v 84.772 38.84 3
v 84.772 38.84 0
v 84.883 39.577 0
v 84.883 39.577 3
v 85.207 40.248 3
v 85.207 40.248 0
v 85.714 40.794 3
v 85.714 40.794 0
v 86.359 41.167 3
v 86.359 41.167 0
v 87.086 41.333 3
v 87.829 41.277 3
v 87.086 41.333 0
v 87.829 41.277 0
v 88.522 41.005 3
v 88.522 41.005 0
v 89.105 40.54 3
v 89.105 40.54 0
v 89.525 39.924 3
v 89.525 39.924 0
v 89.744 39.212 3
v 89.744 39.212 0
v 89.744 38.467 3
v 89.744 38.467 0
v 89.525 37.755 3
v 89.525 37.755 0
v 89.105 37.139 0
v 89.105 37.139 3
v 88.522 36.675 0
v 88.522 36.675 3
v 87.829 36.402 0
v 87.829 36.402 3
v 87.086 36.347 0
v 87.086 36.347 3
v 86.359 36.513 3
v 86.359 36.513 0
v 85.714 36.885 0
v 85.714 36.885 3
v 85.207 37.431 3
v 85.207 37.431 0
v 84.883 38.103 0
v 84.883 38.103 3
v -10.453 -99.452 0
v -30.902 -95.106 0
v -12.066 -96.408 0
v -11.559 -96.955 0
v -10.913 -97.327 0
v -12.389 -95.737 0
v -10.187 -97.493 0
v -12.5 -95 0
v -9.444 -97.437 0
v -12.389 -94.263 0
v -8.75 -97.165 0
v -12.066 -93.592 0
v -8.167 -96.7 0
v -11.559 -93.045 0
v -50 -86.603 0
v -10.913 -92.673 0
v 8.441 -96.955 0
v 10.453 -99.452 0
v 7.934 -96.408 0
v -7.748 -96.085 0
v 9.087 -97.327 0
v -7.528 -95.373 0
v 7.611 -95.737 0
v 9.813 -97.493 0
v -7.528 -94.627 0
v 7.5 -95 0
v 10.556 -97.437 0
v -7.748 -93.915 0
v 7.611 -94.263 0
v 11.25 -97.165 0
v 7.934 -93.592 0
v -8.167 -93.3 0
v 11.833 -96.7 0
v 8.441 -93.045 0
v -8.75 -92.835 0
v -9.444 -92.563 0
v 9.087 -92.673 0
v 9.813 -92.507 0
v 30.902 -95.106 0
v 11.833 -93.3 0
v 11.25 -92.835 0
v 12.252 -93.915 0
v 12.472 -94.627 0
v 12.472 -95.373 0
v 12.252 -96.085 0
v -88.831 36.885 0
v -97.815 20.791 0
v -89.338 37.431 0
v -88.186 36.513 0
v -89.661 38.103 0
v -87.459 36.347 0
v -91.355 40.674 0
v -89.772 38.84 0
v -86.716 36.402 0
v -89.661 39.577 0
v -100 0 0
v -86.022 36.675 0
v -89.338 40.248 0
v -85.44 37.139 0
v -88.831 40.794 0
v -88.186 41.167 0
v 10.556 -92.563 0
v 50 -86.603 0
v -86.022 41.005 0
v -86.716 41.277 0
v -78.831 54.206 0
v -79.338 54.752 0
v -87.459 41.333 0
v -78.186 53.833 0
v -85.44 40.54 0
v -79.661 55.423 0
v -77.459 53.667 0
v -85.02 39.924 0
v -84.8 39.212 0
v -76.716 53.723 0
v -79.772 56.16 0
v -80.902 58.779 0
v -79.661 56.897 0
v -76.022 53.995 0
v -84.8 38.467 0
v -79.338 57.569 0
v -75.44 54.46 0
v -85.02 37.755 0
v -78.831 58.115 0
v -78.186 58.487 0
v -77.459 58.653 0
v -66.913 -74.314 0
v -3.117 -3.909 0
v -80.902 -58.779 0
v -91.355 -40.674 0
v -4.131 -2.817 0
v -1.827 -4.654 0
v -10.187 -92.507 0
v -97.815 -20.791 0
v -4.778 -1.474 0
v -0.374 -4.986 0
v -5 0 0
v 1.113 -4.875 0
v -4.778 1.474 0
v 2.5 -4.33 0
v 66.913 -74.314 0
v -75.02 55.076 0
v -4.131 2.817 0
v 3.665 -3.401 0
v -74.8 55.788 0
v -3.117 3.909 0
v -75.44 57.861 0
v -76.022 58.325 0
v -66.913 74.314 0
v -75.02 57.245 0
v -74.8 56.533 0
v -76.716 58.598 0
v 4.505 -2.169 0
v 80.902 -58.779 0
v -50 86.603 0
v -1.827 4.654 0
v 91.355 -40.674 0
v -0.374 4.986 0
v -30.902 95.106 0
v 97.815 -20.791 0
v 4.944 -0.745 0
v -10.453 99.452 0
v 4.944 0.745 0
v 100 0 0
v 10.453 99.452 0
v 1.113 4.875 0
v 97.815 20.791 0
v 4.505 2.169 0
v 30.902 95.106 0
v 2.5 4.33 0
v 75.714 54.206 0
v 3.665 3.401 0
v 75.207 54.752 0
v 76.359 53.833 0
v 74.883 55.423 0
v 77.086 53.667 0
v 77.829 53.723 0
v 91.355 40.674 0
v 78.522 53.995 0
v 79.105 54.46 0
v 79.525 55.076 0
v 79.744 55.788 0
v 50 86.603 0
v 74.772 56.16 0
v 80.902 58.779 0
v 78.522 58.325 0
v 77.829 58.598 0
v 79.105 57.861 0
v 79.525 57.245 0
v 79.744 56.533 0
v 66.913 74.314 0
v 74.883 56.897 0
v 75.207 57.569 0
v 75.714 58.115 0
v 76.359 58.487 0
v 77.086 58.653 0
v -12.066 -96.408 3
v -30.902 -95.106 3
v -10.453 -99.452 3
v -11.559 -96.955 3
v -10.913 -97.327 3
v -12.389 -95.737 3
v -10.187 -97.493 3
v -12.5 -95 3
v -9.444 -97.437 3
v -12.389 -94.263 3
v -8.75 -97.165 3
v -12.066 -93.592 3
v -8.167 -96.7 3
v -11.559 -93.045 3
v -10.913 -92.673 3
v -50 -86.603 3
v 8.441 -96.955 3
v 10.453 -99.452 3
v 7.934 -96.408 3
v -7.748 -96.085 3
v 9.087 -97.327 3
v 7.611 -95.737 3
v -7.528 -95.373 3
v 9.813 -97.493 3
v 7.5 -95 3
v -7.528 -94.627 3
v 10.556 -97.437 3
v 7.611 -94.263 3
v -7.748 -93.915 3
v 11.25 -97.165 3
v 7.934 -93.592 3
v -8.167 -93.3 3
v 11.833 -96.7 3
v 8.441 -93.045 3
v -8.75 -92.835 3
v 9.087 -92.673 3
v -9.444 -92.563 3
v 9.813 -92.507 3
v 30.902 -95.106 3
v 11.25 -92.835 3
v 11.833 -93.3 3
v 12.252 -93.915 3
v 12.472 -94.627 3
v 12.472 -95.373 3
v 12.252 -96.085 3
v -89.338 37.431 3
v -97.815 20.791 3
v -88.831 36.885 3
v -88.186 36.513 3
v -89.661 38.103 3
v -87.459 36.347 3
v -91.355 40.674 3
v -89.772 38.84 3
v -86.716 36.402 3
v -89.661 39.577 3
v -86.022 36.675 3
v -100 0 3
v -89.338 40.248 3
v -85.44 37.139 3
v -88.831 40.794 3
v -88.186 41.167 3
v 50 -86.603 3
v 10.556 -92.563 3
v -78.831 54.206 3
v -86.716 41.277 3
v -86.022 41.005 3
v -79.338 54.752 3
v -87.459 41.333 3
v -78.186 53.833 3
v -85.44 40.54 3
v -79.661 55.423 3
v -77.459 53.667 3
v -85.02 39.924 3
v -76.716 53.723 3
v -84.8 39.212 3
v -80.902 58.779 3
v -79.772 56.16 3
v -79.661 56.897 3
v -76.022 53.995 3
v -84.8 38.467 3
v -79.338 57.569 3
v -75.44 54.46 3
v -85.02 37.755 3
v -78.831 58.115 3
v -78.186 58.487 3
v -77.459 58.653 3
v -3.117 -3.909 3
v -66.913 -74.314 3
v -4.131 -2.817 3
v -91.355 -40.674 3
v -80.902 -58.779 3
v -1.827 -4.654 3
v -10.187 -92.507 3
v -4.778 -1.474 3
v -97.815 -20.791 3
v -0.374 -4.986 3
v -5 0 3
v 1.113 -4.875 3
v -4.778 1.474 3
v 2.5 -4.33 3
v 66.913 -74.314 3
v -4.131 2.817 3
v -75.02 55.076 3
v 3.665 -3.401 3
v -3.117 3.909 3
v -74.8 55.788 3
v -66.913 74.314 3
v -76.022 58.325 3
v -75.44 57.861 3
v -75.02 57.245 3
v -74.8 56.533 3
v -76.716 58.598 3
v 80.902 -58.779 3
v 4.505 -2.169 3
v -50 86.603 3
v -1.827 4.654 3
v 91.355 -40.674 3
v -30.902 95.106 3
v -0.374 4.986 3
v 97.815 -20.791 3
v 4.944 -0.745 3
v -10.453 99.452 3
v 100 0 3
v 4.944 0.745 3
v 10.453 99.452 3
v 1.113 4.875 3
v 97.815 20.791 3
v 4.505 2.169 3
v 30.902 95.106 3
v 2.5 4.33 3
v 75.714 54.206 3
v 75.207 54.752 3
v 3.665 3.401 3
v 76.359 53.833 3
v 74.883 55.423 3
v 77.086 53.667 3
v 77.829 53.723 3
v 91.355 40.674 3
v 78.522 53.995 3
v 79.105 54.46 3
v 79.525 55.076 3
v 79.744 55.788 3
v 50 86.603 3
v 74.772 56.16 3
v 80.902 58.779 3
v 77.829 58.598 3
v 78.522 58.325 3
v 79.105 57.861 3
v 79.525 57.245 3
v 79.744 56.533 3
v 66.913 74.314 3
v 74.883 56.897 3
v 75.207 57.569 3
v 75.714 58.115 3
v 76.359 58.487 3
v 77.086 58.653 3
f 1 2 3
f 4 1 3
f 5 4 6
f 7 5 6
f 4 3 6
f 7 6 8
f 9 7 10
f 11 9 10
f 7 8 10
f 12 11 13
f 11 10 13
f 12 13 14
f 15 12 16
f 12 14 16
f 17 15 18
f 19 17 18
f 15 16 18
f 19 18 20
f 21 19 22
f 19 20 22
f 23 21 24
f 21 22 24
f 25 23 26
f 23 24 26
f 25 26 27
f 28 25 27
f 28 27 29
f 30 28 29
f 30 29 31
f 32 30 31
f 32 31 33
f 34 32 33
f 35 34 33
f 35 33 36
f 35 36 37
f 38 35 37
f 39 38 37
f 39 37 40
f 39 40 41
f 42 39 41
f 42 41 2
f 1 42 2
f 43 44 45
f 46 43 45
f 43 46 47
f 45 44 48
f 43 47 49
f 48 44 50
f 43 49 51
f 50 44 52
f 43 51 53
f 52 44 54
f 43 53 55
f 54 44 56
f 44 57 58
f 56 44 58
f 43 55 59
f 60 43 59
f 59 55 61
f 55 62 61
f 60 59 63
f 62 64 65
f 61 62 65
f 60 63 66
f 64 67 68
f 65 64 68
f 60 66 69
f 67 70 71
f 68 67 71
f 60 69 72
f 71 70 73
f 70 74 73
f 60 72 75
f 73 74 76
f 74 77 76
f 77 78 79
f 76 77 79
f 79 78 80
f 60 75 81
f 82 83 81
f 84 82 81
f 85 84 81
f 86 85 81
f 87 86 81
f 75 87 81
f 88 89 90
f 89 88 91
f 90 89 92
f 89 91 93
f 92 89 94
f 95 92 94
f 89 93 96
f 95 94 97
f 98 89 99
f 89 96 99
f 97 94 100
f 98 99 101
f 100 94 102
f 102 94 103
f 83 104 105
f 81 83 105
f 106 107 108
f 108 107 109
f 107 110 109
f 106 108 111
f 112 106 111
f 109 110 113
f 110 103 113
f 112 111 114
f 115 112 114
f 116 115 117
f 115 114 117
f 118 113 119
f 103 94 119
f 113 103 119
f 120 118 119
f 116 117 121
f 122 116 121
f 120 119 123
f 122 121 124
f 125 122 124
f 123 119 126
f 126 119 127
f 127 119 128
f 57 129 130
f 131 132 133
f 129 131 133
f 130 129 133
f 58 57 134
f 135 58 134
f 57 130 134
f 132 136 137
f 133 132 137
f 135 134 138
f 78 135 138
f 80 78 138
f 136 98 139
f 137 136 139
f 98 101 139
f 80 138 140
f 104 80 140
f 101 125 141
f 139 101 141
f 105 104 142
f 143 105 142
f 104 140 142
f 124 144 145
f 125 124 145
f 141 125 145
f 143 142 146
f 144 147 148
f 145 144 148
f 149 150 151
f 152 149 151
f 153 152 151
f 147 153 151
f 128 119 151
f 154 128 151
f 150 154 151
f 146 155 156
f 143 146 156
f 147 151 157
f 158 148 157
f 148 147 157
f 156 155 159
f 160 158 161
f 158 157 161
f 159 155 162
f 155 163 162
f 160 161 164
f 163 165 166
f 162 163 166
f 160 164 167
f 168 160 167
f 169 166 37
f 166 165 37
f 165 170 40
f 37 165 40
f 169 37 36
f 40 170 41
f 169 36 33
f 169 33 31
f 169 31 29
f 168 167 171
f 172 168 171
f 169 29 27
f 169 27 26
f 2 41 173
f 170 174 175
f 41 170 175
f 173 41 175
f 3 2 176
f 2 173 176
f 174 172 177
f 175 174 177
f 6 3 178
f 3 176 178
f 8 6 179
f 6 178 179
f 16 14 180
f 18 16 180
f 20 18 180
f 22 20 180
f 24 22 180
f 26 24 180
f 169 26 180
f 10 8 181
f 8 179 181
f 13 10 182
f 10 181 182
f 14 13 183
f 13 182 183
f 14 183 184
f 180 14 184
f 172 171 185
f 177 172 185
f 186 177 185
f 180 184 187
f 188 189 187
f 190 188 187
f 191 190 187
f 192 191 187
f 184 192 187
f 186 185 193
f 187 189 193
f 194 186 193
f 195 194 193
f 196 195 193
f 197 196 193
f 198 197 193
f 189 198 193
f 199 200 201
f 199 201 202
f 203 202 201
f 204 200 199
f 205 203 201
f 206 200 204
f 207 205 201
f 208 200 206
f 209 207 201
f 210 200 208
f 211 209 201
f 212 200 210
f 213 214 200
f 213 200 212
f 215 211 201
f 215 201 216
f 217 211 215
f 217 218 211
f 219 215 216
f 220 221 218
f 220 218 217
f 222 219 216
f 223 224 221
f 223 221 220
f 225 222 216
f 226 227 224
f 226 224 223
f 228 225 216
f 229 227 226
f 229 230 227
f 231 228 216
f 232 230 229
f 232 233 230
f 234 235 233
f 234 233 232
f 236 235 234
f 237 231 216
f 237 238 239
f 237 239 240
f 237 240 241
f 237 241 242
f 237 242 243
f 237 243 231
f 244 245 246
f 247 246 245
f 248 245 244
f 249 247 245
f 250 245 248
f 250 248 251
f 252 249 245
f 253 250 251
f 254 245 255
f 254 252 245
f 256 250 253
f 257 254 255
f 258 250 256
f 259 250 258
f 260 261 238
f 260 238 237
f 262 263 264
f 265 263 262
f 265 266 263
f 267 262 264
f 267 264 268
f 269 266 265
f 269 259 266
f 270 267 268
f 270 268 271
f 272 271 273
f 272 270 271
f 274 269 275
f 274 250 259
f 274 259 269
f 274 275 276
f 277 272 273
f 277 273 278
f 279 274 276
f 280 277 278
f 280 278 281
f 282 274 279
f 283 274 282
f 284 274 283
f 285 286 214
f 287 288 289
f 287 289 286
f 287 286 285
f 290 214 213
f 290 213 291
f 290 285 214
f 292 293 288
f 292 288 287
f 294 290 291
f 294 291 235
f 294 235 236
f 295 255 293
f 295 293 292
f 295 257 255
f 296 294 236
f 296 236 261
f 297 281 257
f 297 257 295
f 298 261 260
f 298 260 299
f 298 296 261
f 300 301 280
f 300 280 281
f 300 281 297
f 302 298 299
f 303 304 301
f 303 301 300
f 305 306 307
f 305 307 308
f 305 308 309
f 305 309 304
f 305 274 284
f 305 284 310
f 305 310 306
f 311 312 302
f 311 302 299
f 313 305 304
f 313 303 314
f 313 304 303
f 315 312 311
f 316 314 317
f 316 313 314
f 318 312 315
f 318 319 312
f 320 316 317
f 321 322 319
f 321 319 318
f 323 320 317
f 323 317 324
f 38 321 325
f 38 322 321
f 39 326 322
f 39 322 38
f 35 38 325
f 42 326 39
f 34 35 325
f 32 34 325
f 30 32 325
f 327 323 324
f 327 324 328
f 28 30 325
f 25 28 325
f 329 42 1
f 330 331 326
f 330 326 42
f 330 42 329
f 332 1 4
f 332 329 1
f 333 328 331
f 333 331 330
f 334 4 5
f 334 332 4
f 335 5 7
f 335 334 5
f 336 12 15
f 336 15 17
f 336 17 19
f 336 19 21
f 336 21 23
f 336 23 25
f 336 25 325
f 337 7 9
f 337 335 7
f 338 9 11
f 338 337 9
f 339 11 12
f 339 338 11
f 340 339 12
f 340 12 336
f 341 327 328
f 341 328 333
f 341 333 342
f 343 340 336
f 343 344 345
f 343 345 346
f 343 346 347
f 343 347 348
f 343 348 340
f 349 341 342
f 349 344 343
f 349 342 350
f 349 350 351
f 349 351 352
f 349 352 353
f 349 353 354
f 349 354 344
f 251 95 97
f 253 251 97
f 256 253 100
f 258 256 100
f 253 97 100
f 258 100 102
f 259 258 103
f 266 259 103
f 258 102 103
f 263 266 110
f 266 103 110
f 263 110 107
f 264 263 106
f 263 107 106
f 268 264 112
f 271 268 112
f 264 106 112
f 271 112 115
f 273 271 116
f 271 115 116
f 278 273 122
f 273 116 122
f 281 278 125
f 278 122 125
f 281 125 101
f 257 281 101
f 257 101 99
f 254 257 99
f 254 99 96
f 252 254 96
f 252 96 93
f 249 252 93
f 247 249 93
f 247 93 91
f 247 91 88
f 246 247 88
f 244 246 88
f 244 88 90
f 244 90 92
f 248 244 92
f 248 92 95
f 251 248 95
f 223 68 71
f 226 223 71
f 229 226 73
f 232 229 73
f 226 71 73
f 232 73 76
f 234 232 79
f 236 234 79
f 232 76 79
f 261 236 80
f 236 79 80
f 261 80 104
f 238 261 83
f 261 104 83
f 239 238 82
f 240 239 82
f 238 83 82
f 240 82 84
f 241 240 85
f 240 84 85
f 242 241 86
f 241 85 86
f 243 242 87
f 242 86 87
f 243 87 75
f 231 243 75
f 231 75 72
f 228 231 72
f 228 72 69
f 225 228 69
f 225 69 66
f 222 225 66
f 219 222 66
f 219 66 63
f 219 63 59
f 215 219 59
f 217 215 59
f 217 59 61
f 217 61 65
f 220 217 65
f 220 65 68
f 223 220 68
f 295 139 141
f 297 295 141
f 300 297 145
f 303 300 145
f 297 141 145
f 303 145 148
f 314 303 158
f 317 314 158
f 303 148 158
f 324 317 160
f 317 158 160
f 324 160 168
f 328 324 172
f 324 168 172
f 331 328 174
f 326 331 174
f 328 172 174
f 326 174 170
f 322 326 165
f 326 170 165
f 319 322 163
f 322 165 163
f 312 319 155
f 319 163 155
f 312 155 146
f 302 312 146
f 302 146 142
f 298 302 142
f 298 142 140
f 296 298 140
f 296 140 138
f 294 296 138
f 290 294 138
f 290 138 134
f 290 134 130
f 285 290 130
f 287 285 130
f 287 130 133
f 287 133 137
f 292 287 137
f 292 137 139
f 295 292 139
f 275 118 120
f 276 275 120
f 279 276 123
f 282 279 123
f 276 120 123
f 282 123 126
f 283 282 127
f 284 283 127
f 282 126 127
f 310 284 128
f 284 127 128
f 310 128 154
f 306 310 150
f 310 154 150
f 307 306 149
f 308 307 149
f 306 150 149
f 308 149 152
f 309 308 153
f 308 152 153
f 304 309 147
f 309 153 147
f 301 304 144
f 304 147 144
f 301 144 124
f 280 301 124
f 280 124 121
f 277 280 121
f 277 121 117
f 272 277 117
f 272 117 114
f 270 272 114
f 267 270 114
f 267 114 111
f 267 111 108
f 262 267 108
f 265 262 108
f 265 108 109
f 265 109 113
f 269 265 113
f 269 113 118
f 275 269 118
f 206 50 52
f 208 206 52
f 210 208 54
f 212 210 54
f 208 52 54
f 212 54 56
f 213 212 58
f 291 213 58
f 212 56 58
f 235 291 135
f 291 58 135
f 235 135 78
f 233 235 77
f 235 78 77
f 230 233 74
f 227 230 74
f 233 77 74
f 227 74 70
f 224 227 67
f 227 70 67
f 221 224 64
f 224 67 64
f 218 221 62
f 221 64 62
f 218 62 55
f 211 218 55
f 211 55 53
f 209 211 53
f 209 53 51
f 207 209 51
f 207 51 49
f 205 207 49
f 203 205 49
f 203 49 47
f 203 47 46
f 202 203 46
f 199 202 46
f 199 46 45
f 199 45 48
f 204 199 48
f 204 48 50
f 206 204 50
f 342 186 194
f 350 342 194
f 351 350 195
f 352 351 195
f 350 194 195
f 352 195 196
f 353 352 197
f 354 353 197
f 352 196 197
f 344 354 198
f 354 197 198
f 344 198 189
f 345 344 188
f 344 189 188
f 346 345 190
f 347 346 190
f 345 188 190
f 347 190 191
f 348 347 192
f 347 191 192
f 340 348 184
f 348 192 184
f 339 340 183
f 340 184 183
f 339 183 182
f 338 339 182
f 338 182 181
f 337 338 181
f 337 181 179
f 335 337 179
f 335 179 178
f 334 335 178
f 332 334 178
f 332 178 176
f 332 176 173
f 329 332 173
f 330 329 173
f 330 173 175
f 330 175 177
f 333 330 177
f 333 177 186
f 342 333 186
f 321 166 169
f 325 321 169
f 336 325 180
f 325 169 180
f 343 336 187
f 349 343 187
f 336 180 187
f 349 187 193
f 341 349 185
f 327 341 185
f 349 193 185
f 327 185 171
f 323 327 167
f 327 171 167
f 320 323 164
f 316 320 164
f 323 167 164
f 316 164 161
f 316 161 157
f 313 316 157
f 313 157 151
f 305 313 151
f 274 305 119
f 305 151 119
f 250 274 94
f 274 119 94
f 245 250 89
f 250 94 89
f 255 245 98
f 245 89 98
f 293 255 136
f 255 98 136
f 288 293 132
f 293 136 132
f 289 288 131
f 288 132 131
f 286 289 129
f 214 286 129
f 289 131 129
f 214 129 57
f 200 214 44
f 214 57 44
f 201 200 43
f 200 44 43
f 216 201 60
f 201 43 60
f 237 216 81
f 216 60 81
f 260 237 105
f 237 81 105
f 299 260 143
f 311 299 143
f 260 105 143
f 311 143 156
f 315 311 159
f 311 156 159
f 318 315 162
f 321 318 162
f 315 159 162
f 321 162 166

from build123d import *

# Parameters (mm, degrees)
F0_R     = 100
F1_DEPTH = 3
F3_D     = 10
F4_D     = 5


with BuildPart() as f1:
    # F0 (on Top) → F1 (new body)
    with BuildSketch(Plane.XY):
        Circle(F0_R)
    extrude(amount=F1_DEPTH)

    # F3 (through all)
    with Locations(Plane.XY.offset(3)):
        with Locations((0, 0)):
            Hole(F3_D / 2)

    # F4 (through all)
    with Locations(Plane.XY.offset(3)):
        with Locations((-10, -95), (10, -95), (87.272413, 38.839746), (77.272413, 56.160254), (-77.272413, 56.160254), (-87.272413, 38.839746)):
            Hole(F4_D / 2)


solid = f1.part
